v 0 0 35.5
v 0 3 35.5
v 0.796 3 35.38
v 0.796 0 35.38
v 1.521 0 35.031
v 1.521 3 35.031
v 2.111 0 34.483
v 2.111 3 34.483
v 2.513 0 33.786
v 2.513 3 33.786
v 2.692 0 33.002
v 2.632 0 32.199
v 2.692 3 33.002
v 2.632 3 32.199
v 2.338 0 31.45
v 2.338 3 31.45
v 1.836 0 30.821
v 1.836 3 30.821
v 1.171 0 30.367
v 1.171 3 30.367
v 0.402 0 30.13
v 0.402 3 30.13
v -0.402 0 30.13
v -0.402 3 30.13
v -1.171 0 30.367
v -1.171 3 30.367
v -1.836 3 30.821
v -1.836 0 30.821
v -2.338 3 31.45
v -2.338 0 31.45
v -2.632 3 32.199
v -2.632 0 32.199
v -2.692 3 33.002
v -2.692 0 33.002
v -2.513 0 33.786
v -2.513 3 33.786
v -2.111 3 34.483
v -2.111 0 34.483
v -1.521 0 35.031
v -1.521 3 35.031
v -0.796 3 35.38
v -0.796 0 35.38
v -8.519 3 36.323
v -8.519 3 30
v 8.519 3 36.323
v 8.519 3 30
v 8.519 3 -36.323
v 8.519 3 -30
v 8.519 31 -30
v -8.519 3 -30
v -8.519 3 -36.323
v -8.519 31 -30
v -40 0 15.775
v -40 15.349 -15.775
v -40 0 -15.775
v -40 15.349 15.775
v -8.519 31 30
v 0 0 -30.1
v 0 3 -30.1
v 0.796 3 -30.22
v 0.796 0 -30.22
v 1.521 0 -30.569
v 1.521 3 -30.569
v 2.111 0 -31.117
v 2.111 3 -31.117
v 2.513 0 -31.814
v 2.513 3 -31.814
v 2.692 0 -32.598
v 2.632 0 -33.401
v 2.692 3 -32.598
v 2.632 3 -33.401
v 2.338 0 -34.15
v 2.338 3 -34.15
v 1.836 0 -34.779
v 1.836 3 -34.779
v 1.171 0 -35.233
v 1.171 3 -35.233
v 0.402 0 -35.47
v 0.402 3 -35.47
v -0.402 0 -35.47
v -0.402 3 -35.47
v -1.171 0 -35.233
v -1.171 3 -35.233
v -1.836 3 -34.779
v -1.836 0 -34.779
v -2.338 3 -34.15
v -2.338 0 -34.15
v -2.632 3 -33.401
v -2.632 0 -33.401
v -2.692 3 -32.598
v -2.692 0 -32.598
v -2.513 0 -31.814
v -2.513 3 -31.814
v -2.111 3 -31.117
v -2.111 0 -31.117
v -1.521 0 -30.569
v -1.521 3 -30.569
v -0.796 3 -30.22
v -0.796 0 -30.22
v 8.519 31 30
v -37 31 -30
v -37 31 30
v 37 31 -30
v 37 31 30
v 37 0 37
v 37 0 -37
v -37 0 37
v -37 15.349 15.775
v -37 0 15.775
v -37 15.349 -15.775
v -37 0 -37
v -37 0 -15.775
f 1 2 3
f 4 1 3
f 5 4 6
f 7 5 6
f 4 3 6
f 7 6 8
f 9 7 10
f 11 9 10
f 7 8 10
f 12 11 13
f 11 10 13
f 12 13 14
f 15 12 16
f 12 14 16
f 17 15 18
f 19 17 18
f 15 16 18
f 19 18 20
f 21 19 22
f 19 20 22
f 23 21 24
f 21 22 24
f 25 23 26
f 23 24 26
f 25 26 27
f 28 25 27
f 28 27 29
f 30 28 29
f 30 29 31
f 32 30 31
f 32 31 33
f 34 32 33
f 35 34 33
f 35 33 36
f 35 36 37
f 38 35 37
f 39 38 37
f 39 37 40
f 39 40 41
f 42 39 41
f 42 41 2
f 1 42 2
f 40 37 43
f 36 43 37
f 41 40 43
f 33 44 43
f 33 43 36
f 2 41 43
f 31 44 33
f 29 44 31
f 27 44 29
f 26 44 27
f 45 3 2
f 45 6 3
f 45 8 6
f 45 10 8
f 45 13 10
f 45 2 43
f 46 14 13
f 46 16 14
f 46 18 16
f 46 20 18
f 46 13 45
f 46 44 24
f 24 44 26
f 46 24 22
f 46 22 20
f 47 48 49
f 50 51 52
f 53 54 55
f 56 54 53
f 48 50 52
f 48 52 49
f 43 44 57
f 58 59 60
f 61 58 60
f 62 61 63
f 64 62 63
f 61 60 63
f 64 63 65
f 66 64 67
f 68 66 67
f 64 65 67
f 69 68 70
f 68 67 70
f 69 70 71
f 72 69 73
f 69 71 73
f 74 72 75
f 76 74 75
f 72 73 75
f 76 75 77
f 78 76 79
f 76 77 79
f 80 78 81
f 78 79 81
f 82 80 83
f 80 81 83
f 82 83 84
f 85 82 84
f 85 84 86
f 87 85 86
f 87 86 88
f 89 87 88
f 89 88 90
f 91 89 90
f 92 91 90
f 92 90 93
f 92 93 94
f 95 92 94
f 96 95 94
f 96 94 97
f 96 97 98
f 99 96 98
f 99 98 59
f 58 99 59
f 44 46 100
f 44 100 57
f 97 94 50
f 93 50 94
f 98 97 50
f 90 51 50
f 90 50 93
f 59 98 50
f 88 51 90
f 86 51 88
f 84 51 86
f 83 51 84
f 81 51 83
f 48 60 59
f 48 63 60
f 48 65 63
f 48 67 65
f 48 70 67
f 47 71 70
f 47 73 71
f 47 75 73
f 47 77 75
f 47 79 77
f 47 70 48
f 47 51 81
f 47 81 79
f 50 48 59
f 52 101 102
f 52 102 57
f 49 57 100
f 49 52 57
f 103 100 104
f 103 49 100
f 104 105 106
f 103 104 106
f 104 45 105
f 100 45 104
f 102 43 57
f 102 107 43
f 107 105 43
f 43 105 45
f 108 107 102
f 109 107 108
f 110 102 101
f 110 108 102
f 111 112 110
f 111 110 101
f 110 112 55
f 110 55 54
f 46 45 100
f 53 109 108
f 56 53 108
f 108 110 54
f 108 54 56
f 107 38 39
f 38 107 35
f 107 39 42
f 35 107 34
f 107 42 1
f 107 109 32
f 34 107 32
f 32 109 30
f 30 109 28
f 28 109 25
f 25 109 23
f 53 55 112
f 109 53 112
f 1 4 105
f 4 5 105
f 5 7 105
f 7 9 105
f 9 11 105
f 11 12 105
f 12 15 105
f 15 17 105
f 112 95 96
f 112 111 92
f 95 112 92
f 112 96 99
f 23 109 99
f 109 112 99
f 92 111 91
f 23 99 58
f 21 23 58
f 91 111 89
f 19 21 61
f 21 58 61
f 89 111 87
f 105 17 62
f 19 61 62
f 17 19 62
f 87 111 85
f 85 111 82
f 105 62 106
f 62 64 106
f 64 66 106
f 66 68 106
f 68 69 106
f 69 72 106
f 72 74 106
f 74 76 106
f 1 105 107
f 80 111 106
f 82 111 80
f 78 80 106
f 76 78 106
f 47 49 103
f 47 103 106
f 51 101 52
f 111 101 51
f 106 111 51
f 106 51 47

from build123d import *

# Parameters (mm, degrees)
SKETCH_1_W          = 74
SKETCH_1_H          = 74
EXTRUDE_1_DEPTH     = 31
SKETCH_2_OUTSIDE_W  = 97.83
SKETCH_2_OUTSIDE_H  = 54.83
CUT_EXTRUDE_1_DEPTH = 89.351570444
SKETCH_3_W          = 31.549660128
SKETCH_3_H          = 15.349381196
EXTRUDE_2_DEPTH     = 3
CUT_EXTRUDE_2_DEPTH = 28
SKETCH_6_R          = 2.7
CUT_EXTRUDE_4_DEPTH = 28


with BuildPart() as part:
    # 草图1 → 凸台-拉伸1 (new body)
    with BuildSketch(Plane(origin=(0, 0, 0), x_dir=(1, 0, 0), z_dir=(0, 1, 0))):
        Rectangle(SKETCH_1_W, SKETCH_1_H)
    extrude(amount=EXTRUDE_1_DEPTH)

    # 草图2 outside → 切除-拉伸1 (cut, through all)
    with BuildSketch(Plane.ZY.offset(37)):
        with Locations((0, 15.5)):
            Rectangle(SKETCH_2_OUTSIDE_W, SKETCH_2_OUTSIDE_H)
        Polygon((30, 31), (-30, 31), (-37, 0), (37, 0), align=None, mode=Mode.SUBTRACT)
    extrude(amount=-CUT_EXTRUDE_1_DEPTH, mode=Mode.SUBTRACT)

    # 草图3 → 凸台-拉伸2 (add)
    with BuildSketch(Plane.ZY.offset(37)):
        with Locations((0, 7.674690598)):
            Rectangle(SKETCH_3_W, SKETCH_3_H)
    extrude(amount=EXTRUDE_2_DEPTH)

    # 草图4 → 切除-拉伸2 (cut)
    with BuildSketch(Plane(origin=(0, 31, 0), x_dir=(1, 0, 0), z_dir=(0, 1, 0))):
        Polygon((8.519431151, 37), (-8.519431151, 37), (0, 33.5), align=None)
        Polygon((-8.519431151, 37), (-8.519431151, 30), (0, 33.5), align=None)
        Polygon((0, 33.5), (8.519431151, 30), (8.519431151, 37), align=None)
        Polygon((0, 33.5), (-8.519431151, 30), (8.519431151, 30), align=None)
        Polygon((-8.519431151, -30), (-8.519431151, -37), (0, -33.5), align=None)
        Polygon((0, -33.5), (-8.519431151, -37), (8.519431151, -37), align=None)
        Polygon((0, -33.5), (8.519431151, -37), (8.519431151, -30), align=None)
        Polygon((8.519431151, -30), (-8.519431151, -30), (0, -33.5), align=None)
    extrude(amount=-CUT_EXTRUDE_2_DEPTH, mode=Mode.SUBTRACT)

    # 草图6 → 切除-拉伸4 (cut)
    with BuildSketch(Plane(origin=(0, 3, 0), x_dir=(1, 0, 0), z_dir=(0, 1, 0))):
        with Locations(Location((0, -32.8, 0), (0, 0, 270))):
            Circle(SKETCH_6_R)
        with Locations(Location((0, 32.8, 0), (0, 0, 270))):
            Circle(SKETCH_6_R)
    extrude(amount=-CUT_EXTRUDE_4_DEPTH, mode=Mode.SUBTRACT)


solid = part.part
